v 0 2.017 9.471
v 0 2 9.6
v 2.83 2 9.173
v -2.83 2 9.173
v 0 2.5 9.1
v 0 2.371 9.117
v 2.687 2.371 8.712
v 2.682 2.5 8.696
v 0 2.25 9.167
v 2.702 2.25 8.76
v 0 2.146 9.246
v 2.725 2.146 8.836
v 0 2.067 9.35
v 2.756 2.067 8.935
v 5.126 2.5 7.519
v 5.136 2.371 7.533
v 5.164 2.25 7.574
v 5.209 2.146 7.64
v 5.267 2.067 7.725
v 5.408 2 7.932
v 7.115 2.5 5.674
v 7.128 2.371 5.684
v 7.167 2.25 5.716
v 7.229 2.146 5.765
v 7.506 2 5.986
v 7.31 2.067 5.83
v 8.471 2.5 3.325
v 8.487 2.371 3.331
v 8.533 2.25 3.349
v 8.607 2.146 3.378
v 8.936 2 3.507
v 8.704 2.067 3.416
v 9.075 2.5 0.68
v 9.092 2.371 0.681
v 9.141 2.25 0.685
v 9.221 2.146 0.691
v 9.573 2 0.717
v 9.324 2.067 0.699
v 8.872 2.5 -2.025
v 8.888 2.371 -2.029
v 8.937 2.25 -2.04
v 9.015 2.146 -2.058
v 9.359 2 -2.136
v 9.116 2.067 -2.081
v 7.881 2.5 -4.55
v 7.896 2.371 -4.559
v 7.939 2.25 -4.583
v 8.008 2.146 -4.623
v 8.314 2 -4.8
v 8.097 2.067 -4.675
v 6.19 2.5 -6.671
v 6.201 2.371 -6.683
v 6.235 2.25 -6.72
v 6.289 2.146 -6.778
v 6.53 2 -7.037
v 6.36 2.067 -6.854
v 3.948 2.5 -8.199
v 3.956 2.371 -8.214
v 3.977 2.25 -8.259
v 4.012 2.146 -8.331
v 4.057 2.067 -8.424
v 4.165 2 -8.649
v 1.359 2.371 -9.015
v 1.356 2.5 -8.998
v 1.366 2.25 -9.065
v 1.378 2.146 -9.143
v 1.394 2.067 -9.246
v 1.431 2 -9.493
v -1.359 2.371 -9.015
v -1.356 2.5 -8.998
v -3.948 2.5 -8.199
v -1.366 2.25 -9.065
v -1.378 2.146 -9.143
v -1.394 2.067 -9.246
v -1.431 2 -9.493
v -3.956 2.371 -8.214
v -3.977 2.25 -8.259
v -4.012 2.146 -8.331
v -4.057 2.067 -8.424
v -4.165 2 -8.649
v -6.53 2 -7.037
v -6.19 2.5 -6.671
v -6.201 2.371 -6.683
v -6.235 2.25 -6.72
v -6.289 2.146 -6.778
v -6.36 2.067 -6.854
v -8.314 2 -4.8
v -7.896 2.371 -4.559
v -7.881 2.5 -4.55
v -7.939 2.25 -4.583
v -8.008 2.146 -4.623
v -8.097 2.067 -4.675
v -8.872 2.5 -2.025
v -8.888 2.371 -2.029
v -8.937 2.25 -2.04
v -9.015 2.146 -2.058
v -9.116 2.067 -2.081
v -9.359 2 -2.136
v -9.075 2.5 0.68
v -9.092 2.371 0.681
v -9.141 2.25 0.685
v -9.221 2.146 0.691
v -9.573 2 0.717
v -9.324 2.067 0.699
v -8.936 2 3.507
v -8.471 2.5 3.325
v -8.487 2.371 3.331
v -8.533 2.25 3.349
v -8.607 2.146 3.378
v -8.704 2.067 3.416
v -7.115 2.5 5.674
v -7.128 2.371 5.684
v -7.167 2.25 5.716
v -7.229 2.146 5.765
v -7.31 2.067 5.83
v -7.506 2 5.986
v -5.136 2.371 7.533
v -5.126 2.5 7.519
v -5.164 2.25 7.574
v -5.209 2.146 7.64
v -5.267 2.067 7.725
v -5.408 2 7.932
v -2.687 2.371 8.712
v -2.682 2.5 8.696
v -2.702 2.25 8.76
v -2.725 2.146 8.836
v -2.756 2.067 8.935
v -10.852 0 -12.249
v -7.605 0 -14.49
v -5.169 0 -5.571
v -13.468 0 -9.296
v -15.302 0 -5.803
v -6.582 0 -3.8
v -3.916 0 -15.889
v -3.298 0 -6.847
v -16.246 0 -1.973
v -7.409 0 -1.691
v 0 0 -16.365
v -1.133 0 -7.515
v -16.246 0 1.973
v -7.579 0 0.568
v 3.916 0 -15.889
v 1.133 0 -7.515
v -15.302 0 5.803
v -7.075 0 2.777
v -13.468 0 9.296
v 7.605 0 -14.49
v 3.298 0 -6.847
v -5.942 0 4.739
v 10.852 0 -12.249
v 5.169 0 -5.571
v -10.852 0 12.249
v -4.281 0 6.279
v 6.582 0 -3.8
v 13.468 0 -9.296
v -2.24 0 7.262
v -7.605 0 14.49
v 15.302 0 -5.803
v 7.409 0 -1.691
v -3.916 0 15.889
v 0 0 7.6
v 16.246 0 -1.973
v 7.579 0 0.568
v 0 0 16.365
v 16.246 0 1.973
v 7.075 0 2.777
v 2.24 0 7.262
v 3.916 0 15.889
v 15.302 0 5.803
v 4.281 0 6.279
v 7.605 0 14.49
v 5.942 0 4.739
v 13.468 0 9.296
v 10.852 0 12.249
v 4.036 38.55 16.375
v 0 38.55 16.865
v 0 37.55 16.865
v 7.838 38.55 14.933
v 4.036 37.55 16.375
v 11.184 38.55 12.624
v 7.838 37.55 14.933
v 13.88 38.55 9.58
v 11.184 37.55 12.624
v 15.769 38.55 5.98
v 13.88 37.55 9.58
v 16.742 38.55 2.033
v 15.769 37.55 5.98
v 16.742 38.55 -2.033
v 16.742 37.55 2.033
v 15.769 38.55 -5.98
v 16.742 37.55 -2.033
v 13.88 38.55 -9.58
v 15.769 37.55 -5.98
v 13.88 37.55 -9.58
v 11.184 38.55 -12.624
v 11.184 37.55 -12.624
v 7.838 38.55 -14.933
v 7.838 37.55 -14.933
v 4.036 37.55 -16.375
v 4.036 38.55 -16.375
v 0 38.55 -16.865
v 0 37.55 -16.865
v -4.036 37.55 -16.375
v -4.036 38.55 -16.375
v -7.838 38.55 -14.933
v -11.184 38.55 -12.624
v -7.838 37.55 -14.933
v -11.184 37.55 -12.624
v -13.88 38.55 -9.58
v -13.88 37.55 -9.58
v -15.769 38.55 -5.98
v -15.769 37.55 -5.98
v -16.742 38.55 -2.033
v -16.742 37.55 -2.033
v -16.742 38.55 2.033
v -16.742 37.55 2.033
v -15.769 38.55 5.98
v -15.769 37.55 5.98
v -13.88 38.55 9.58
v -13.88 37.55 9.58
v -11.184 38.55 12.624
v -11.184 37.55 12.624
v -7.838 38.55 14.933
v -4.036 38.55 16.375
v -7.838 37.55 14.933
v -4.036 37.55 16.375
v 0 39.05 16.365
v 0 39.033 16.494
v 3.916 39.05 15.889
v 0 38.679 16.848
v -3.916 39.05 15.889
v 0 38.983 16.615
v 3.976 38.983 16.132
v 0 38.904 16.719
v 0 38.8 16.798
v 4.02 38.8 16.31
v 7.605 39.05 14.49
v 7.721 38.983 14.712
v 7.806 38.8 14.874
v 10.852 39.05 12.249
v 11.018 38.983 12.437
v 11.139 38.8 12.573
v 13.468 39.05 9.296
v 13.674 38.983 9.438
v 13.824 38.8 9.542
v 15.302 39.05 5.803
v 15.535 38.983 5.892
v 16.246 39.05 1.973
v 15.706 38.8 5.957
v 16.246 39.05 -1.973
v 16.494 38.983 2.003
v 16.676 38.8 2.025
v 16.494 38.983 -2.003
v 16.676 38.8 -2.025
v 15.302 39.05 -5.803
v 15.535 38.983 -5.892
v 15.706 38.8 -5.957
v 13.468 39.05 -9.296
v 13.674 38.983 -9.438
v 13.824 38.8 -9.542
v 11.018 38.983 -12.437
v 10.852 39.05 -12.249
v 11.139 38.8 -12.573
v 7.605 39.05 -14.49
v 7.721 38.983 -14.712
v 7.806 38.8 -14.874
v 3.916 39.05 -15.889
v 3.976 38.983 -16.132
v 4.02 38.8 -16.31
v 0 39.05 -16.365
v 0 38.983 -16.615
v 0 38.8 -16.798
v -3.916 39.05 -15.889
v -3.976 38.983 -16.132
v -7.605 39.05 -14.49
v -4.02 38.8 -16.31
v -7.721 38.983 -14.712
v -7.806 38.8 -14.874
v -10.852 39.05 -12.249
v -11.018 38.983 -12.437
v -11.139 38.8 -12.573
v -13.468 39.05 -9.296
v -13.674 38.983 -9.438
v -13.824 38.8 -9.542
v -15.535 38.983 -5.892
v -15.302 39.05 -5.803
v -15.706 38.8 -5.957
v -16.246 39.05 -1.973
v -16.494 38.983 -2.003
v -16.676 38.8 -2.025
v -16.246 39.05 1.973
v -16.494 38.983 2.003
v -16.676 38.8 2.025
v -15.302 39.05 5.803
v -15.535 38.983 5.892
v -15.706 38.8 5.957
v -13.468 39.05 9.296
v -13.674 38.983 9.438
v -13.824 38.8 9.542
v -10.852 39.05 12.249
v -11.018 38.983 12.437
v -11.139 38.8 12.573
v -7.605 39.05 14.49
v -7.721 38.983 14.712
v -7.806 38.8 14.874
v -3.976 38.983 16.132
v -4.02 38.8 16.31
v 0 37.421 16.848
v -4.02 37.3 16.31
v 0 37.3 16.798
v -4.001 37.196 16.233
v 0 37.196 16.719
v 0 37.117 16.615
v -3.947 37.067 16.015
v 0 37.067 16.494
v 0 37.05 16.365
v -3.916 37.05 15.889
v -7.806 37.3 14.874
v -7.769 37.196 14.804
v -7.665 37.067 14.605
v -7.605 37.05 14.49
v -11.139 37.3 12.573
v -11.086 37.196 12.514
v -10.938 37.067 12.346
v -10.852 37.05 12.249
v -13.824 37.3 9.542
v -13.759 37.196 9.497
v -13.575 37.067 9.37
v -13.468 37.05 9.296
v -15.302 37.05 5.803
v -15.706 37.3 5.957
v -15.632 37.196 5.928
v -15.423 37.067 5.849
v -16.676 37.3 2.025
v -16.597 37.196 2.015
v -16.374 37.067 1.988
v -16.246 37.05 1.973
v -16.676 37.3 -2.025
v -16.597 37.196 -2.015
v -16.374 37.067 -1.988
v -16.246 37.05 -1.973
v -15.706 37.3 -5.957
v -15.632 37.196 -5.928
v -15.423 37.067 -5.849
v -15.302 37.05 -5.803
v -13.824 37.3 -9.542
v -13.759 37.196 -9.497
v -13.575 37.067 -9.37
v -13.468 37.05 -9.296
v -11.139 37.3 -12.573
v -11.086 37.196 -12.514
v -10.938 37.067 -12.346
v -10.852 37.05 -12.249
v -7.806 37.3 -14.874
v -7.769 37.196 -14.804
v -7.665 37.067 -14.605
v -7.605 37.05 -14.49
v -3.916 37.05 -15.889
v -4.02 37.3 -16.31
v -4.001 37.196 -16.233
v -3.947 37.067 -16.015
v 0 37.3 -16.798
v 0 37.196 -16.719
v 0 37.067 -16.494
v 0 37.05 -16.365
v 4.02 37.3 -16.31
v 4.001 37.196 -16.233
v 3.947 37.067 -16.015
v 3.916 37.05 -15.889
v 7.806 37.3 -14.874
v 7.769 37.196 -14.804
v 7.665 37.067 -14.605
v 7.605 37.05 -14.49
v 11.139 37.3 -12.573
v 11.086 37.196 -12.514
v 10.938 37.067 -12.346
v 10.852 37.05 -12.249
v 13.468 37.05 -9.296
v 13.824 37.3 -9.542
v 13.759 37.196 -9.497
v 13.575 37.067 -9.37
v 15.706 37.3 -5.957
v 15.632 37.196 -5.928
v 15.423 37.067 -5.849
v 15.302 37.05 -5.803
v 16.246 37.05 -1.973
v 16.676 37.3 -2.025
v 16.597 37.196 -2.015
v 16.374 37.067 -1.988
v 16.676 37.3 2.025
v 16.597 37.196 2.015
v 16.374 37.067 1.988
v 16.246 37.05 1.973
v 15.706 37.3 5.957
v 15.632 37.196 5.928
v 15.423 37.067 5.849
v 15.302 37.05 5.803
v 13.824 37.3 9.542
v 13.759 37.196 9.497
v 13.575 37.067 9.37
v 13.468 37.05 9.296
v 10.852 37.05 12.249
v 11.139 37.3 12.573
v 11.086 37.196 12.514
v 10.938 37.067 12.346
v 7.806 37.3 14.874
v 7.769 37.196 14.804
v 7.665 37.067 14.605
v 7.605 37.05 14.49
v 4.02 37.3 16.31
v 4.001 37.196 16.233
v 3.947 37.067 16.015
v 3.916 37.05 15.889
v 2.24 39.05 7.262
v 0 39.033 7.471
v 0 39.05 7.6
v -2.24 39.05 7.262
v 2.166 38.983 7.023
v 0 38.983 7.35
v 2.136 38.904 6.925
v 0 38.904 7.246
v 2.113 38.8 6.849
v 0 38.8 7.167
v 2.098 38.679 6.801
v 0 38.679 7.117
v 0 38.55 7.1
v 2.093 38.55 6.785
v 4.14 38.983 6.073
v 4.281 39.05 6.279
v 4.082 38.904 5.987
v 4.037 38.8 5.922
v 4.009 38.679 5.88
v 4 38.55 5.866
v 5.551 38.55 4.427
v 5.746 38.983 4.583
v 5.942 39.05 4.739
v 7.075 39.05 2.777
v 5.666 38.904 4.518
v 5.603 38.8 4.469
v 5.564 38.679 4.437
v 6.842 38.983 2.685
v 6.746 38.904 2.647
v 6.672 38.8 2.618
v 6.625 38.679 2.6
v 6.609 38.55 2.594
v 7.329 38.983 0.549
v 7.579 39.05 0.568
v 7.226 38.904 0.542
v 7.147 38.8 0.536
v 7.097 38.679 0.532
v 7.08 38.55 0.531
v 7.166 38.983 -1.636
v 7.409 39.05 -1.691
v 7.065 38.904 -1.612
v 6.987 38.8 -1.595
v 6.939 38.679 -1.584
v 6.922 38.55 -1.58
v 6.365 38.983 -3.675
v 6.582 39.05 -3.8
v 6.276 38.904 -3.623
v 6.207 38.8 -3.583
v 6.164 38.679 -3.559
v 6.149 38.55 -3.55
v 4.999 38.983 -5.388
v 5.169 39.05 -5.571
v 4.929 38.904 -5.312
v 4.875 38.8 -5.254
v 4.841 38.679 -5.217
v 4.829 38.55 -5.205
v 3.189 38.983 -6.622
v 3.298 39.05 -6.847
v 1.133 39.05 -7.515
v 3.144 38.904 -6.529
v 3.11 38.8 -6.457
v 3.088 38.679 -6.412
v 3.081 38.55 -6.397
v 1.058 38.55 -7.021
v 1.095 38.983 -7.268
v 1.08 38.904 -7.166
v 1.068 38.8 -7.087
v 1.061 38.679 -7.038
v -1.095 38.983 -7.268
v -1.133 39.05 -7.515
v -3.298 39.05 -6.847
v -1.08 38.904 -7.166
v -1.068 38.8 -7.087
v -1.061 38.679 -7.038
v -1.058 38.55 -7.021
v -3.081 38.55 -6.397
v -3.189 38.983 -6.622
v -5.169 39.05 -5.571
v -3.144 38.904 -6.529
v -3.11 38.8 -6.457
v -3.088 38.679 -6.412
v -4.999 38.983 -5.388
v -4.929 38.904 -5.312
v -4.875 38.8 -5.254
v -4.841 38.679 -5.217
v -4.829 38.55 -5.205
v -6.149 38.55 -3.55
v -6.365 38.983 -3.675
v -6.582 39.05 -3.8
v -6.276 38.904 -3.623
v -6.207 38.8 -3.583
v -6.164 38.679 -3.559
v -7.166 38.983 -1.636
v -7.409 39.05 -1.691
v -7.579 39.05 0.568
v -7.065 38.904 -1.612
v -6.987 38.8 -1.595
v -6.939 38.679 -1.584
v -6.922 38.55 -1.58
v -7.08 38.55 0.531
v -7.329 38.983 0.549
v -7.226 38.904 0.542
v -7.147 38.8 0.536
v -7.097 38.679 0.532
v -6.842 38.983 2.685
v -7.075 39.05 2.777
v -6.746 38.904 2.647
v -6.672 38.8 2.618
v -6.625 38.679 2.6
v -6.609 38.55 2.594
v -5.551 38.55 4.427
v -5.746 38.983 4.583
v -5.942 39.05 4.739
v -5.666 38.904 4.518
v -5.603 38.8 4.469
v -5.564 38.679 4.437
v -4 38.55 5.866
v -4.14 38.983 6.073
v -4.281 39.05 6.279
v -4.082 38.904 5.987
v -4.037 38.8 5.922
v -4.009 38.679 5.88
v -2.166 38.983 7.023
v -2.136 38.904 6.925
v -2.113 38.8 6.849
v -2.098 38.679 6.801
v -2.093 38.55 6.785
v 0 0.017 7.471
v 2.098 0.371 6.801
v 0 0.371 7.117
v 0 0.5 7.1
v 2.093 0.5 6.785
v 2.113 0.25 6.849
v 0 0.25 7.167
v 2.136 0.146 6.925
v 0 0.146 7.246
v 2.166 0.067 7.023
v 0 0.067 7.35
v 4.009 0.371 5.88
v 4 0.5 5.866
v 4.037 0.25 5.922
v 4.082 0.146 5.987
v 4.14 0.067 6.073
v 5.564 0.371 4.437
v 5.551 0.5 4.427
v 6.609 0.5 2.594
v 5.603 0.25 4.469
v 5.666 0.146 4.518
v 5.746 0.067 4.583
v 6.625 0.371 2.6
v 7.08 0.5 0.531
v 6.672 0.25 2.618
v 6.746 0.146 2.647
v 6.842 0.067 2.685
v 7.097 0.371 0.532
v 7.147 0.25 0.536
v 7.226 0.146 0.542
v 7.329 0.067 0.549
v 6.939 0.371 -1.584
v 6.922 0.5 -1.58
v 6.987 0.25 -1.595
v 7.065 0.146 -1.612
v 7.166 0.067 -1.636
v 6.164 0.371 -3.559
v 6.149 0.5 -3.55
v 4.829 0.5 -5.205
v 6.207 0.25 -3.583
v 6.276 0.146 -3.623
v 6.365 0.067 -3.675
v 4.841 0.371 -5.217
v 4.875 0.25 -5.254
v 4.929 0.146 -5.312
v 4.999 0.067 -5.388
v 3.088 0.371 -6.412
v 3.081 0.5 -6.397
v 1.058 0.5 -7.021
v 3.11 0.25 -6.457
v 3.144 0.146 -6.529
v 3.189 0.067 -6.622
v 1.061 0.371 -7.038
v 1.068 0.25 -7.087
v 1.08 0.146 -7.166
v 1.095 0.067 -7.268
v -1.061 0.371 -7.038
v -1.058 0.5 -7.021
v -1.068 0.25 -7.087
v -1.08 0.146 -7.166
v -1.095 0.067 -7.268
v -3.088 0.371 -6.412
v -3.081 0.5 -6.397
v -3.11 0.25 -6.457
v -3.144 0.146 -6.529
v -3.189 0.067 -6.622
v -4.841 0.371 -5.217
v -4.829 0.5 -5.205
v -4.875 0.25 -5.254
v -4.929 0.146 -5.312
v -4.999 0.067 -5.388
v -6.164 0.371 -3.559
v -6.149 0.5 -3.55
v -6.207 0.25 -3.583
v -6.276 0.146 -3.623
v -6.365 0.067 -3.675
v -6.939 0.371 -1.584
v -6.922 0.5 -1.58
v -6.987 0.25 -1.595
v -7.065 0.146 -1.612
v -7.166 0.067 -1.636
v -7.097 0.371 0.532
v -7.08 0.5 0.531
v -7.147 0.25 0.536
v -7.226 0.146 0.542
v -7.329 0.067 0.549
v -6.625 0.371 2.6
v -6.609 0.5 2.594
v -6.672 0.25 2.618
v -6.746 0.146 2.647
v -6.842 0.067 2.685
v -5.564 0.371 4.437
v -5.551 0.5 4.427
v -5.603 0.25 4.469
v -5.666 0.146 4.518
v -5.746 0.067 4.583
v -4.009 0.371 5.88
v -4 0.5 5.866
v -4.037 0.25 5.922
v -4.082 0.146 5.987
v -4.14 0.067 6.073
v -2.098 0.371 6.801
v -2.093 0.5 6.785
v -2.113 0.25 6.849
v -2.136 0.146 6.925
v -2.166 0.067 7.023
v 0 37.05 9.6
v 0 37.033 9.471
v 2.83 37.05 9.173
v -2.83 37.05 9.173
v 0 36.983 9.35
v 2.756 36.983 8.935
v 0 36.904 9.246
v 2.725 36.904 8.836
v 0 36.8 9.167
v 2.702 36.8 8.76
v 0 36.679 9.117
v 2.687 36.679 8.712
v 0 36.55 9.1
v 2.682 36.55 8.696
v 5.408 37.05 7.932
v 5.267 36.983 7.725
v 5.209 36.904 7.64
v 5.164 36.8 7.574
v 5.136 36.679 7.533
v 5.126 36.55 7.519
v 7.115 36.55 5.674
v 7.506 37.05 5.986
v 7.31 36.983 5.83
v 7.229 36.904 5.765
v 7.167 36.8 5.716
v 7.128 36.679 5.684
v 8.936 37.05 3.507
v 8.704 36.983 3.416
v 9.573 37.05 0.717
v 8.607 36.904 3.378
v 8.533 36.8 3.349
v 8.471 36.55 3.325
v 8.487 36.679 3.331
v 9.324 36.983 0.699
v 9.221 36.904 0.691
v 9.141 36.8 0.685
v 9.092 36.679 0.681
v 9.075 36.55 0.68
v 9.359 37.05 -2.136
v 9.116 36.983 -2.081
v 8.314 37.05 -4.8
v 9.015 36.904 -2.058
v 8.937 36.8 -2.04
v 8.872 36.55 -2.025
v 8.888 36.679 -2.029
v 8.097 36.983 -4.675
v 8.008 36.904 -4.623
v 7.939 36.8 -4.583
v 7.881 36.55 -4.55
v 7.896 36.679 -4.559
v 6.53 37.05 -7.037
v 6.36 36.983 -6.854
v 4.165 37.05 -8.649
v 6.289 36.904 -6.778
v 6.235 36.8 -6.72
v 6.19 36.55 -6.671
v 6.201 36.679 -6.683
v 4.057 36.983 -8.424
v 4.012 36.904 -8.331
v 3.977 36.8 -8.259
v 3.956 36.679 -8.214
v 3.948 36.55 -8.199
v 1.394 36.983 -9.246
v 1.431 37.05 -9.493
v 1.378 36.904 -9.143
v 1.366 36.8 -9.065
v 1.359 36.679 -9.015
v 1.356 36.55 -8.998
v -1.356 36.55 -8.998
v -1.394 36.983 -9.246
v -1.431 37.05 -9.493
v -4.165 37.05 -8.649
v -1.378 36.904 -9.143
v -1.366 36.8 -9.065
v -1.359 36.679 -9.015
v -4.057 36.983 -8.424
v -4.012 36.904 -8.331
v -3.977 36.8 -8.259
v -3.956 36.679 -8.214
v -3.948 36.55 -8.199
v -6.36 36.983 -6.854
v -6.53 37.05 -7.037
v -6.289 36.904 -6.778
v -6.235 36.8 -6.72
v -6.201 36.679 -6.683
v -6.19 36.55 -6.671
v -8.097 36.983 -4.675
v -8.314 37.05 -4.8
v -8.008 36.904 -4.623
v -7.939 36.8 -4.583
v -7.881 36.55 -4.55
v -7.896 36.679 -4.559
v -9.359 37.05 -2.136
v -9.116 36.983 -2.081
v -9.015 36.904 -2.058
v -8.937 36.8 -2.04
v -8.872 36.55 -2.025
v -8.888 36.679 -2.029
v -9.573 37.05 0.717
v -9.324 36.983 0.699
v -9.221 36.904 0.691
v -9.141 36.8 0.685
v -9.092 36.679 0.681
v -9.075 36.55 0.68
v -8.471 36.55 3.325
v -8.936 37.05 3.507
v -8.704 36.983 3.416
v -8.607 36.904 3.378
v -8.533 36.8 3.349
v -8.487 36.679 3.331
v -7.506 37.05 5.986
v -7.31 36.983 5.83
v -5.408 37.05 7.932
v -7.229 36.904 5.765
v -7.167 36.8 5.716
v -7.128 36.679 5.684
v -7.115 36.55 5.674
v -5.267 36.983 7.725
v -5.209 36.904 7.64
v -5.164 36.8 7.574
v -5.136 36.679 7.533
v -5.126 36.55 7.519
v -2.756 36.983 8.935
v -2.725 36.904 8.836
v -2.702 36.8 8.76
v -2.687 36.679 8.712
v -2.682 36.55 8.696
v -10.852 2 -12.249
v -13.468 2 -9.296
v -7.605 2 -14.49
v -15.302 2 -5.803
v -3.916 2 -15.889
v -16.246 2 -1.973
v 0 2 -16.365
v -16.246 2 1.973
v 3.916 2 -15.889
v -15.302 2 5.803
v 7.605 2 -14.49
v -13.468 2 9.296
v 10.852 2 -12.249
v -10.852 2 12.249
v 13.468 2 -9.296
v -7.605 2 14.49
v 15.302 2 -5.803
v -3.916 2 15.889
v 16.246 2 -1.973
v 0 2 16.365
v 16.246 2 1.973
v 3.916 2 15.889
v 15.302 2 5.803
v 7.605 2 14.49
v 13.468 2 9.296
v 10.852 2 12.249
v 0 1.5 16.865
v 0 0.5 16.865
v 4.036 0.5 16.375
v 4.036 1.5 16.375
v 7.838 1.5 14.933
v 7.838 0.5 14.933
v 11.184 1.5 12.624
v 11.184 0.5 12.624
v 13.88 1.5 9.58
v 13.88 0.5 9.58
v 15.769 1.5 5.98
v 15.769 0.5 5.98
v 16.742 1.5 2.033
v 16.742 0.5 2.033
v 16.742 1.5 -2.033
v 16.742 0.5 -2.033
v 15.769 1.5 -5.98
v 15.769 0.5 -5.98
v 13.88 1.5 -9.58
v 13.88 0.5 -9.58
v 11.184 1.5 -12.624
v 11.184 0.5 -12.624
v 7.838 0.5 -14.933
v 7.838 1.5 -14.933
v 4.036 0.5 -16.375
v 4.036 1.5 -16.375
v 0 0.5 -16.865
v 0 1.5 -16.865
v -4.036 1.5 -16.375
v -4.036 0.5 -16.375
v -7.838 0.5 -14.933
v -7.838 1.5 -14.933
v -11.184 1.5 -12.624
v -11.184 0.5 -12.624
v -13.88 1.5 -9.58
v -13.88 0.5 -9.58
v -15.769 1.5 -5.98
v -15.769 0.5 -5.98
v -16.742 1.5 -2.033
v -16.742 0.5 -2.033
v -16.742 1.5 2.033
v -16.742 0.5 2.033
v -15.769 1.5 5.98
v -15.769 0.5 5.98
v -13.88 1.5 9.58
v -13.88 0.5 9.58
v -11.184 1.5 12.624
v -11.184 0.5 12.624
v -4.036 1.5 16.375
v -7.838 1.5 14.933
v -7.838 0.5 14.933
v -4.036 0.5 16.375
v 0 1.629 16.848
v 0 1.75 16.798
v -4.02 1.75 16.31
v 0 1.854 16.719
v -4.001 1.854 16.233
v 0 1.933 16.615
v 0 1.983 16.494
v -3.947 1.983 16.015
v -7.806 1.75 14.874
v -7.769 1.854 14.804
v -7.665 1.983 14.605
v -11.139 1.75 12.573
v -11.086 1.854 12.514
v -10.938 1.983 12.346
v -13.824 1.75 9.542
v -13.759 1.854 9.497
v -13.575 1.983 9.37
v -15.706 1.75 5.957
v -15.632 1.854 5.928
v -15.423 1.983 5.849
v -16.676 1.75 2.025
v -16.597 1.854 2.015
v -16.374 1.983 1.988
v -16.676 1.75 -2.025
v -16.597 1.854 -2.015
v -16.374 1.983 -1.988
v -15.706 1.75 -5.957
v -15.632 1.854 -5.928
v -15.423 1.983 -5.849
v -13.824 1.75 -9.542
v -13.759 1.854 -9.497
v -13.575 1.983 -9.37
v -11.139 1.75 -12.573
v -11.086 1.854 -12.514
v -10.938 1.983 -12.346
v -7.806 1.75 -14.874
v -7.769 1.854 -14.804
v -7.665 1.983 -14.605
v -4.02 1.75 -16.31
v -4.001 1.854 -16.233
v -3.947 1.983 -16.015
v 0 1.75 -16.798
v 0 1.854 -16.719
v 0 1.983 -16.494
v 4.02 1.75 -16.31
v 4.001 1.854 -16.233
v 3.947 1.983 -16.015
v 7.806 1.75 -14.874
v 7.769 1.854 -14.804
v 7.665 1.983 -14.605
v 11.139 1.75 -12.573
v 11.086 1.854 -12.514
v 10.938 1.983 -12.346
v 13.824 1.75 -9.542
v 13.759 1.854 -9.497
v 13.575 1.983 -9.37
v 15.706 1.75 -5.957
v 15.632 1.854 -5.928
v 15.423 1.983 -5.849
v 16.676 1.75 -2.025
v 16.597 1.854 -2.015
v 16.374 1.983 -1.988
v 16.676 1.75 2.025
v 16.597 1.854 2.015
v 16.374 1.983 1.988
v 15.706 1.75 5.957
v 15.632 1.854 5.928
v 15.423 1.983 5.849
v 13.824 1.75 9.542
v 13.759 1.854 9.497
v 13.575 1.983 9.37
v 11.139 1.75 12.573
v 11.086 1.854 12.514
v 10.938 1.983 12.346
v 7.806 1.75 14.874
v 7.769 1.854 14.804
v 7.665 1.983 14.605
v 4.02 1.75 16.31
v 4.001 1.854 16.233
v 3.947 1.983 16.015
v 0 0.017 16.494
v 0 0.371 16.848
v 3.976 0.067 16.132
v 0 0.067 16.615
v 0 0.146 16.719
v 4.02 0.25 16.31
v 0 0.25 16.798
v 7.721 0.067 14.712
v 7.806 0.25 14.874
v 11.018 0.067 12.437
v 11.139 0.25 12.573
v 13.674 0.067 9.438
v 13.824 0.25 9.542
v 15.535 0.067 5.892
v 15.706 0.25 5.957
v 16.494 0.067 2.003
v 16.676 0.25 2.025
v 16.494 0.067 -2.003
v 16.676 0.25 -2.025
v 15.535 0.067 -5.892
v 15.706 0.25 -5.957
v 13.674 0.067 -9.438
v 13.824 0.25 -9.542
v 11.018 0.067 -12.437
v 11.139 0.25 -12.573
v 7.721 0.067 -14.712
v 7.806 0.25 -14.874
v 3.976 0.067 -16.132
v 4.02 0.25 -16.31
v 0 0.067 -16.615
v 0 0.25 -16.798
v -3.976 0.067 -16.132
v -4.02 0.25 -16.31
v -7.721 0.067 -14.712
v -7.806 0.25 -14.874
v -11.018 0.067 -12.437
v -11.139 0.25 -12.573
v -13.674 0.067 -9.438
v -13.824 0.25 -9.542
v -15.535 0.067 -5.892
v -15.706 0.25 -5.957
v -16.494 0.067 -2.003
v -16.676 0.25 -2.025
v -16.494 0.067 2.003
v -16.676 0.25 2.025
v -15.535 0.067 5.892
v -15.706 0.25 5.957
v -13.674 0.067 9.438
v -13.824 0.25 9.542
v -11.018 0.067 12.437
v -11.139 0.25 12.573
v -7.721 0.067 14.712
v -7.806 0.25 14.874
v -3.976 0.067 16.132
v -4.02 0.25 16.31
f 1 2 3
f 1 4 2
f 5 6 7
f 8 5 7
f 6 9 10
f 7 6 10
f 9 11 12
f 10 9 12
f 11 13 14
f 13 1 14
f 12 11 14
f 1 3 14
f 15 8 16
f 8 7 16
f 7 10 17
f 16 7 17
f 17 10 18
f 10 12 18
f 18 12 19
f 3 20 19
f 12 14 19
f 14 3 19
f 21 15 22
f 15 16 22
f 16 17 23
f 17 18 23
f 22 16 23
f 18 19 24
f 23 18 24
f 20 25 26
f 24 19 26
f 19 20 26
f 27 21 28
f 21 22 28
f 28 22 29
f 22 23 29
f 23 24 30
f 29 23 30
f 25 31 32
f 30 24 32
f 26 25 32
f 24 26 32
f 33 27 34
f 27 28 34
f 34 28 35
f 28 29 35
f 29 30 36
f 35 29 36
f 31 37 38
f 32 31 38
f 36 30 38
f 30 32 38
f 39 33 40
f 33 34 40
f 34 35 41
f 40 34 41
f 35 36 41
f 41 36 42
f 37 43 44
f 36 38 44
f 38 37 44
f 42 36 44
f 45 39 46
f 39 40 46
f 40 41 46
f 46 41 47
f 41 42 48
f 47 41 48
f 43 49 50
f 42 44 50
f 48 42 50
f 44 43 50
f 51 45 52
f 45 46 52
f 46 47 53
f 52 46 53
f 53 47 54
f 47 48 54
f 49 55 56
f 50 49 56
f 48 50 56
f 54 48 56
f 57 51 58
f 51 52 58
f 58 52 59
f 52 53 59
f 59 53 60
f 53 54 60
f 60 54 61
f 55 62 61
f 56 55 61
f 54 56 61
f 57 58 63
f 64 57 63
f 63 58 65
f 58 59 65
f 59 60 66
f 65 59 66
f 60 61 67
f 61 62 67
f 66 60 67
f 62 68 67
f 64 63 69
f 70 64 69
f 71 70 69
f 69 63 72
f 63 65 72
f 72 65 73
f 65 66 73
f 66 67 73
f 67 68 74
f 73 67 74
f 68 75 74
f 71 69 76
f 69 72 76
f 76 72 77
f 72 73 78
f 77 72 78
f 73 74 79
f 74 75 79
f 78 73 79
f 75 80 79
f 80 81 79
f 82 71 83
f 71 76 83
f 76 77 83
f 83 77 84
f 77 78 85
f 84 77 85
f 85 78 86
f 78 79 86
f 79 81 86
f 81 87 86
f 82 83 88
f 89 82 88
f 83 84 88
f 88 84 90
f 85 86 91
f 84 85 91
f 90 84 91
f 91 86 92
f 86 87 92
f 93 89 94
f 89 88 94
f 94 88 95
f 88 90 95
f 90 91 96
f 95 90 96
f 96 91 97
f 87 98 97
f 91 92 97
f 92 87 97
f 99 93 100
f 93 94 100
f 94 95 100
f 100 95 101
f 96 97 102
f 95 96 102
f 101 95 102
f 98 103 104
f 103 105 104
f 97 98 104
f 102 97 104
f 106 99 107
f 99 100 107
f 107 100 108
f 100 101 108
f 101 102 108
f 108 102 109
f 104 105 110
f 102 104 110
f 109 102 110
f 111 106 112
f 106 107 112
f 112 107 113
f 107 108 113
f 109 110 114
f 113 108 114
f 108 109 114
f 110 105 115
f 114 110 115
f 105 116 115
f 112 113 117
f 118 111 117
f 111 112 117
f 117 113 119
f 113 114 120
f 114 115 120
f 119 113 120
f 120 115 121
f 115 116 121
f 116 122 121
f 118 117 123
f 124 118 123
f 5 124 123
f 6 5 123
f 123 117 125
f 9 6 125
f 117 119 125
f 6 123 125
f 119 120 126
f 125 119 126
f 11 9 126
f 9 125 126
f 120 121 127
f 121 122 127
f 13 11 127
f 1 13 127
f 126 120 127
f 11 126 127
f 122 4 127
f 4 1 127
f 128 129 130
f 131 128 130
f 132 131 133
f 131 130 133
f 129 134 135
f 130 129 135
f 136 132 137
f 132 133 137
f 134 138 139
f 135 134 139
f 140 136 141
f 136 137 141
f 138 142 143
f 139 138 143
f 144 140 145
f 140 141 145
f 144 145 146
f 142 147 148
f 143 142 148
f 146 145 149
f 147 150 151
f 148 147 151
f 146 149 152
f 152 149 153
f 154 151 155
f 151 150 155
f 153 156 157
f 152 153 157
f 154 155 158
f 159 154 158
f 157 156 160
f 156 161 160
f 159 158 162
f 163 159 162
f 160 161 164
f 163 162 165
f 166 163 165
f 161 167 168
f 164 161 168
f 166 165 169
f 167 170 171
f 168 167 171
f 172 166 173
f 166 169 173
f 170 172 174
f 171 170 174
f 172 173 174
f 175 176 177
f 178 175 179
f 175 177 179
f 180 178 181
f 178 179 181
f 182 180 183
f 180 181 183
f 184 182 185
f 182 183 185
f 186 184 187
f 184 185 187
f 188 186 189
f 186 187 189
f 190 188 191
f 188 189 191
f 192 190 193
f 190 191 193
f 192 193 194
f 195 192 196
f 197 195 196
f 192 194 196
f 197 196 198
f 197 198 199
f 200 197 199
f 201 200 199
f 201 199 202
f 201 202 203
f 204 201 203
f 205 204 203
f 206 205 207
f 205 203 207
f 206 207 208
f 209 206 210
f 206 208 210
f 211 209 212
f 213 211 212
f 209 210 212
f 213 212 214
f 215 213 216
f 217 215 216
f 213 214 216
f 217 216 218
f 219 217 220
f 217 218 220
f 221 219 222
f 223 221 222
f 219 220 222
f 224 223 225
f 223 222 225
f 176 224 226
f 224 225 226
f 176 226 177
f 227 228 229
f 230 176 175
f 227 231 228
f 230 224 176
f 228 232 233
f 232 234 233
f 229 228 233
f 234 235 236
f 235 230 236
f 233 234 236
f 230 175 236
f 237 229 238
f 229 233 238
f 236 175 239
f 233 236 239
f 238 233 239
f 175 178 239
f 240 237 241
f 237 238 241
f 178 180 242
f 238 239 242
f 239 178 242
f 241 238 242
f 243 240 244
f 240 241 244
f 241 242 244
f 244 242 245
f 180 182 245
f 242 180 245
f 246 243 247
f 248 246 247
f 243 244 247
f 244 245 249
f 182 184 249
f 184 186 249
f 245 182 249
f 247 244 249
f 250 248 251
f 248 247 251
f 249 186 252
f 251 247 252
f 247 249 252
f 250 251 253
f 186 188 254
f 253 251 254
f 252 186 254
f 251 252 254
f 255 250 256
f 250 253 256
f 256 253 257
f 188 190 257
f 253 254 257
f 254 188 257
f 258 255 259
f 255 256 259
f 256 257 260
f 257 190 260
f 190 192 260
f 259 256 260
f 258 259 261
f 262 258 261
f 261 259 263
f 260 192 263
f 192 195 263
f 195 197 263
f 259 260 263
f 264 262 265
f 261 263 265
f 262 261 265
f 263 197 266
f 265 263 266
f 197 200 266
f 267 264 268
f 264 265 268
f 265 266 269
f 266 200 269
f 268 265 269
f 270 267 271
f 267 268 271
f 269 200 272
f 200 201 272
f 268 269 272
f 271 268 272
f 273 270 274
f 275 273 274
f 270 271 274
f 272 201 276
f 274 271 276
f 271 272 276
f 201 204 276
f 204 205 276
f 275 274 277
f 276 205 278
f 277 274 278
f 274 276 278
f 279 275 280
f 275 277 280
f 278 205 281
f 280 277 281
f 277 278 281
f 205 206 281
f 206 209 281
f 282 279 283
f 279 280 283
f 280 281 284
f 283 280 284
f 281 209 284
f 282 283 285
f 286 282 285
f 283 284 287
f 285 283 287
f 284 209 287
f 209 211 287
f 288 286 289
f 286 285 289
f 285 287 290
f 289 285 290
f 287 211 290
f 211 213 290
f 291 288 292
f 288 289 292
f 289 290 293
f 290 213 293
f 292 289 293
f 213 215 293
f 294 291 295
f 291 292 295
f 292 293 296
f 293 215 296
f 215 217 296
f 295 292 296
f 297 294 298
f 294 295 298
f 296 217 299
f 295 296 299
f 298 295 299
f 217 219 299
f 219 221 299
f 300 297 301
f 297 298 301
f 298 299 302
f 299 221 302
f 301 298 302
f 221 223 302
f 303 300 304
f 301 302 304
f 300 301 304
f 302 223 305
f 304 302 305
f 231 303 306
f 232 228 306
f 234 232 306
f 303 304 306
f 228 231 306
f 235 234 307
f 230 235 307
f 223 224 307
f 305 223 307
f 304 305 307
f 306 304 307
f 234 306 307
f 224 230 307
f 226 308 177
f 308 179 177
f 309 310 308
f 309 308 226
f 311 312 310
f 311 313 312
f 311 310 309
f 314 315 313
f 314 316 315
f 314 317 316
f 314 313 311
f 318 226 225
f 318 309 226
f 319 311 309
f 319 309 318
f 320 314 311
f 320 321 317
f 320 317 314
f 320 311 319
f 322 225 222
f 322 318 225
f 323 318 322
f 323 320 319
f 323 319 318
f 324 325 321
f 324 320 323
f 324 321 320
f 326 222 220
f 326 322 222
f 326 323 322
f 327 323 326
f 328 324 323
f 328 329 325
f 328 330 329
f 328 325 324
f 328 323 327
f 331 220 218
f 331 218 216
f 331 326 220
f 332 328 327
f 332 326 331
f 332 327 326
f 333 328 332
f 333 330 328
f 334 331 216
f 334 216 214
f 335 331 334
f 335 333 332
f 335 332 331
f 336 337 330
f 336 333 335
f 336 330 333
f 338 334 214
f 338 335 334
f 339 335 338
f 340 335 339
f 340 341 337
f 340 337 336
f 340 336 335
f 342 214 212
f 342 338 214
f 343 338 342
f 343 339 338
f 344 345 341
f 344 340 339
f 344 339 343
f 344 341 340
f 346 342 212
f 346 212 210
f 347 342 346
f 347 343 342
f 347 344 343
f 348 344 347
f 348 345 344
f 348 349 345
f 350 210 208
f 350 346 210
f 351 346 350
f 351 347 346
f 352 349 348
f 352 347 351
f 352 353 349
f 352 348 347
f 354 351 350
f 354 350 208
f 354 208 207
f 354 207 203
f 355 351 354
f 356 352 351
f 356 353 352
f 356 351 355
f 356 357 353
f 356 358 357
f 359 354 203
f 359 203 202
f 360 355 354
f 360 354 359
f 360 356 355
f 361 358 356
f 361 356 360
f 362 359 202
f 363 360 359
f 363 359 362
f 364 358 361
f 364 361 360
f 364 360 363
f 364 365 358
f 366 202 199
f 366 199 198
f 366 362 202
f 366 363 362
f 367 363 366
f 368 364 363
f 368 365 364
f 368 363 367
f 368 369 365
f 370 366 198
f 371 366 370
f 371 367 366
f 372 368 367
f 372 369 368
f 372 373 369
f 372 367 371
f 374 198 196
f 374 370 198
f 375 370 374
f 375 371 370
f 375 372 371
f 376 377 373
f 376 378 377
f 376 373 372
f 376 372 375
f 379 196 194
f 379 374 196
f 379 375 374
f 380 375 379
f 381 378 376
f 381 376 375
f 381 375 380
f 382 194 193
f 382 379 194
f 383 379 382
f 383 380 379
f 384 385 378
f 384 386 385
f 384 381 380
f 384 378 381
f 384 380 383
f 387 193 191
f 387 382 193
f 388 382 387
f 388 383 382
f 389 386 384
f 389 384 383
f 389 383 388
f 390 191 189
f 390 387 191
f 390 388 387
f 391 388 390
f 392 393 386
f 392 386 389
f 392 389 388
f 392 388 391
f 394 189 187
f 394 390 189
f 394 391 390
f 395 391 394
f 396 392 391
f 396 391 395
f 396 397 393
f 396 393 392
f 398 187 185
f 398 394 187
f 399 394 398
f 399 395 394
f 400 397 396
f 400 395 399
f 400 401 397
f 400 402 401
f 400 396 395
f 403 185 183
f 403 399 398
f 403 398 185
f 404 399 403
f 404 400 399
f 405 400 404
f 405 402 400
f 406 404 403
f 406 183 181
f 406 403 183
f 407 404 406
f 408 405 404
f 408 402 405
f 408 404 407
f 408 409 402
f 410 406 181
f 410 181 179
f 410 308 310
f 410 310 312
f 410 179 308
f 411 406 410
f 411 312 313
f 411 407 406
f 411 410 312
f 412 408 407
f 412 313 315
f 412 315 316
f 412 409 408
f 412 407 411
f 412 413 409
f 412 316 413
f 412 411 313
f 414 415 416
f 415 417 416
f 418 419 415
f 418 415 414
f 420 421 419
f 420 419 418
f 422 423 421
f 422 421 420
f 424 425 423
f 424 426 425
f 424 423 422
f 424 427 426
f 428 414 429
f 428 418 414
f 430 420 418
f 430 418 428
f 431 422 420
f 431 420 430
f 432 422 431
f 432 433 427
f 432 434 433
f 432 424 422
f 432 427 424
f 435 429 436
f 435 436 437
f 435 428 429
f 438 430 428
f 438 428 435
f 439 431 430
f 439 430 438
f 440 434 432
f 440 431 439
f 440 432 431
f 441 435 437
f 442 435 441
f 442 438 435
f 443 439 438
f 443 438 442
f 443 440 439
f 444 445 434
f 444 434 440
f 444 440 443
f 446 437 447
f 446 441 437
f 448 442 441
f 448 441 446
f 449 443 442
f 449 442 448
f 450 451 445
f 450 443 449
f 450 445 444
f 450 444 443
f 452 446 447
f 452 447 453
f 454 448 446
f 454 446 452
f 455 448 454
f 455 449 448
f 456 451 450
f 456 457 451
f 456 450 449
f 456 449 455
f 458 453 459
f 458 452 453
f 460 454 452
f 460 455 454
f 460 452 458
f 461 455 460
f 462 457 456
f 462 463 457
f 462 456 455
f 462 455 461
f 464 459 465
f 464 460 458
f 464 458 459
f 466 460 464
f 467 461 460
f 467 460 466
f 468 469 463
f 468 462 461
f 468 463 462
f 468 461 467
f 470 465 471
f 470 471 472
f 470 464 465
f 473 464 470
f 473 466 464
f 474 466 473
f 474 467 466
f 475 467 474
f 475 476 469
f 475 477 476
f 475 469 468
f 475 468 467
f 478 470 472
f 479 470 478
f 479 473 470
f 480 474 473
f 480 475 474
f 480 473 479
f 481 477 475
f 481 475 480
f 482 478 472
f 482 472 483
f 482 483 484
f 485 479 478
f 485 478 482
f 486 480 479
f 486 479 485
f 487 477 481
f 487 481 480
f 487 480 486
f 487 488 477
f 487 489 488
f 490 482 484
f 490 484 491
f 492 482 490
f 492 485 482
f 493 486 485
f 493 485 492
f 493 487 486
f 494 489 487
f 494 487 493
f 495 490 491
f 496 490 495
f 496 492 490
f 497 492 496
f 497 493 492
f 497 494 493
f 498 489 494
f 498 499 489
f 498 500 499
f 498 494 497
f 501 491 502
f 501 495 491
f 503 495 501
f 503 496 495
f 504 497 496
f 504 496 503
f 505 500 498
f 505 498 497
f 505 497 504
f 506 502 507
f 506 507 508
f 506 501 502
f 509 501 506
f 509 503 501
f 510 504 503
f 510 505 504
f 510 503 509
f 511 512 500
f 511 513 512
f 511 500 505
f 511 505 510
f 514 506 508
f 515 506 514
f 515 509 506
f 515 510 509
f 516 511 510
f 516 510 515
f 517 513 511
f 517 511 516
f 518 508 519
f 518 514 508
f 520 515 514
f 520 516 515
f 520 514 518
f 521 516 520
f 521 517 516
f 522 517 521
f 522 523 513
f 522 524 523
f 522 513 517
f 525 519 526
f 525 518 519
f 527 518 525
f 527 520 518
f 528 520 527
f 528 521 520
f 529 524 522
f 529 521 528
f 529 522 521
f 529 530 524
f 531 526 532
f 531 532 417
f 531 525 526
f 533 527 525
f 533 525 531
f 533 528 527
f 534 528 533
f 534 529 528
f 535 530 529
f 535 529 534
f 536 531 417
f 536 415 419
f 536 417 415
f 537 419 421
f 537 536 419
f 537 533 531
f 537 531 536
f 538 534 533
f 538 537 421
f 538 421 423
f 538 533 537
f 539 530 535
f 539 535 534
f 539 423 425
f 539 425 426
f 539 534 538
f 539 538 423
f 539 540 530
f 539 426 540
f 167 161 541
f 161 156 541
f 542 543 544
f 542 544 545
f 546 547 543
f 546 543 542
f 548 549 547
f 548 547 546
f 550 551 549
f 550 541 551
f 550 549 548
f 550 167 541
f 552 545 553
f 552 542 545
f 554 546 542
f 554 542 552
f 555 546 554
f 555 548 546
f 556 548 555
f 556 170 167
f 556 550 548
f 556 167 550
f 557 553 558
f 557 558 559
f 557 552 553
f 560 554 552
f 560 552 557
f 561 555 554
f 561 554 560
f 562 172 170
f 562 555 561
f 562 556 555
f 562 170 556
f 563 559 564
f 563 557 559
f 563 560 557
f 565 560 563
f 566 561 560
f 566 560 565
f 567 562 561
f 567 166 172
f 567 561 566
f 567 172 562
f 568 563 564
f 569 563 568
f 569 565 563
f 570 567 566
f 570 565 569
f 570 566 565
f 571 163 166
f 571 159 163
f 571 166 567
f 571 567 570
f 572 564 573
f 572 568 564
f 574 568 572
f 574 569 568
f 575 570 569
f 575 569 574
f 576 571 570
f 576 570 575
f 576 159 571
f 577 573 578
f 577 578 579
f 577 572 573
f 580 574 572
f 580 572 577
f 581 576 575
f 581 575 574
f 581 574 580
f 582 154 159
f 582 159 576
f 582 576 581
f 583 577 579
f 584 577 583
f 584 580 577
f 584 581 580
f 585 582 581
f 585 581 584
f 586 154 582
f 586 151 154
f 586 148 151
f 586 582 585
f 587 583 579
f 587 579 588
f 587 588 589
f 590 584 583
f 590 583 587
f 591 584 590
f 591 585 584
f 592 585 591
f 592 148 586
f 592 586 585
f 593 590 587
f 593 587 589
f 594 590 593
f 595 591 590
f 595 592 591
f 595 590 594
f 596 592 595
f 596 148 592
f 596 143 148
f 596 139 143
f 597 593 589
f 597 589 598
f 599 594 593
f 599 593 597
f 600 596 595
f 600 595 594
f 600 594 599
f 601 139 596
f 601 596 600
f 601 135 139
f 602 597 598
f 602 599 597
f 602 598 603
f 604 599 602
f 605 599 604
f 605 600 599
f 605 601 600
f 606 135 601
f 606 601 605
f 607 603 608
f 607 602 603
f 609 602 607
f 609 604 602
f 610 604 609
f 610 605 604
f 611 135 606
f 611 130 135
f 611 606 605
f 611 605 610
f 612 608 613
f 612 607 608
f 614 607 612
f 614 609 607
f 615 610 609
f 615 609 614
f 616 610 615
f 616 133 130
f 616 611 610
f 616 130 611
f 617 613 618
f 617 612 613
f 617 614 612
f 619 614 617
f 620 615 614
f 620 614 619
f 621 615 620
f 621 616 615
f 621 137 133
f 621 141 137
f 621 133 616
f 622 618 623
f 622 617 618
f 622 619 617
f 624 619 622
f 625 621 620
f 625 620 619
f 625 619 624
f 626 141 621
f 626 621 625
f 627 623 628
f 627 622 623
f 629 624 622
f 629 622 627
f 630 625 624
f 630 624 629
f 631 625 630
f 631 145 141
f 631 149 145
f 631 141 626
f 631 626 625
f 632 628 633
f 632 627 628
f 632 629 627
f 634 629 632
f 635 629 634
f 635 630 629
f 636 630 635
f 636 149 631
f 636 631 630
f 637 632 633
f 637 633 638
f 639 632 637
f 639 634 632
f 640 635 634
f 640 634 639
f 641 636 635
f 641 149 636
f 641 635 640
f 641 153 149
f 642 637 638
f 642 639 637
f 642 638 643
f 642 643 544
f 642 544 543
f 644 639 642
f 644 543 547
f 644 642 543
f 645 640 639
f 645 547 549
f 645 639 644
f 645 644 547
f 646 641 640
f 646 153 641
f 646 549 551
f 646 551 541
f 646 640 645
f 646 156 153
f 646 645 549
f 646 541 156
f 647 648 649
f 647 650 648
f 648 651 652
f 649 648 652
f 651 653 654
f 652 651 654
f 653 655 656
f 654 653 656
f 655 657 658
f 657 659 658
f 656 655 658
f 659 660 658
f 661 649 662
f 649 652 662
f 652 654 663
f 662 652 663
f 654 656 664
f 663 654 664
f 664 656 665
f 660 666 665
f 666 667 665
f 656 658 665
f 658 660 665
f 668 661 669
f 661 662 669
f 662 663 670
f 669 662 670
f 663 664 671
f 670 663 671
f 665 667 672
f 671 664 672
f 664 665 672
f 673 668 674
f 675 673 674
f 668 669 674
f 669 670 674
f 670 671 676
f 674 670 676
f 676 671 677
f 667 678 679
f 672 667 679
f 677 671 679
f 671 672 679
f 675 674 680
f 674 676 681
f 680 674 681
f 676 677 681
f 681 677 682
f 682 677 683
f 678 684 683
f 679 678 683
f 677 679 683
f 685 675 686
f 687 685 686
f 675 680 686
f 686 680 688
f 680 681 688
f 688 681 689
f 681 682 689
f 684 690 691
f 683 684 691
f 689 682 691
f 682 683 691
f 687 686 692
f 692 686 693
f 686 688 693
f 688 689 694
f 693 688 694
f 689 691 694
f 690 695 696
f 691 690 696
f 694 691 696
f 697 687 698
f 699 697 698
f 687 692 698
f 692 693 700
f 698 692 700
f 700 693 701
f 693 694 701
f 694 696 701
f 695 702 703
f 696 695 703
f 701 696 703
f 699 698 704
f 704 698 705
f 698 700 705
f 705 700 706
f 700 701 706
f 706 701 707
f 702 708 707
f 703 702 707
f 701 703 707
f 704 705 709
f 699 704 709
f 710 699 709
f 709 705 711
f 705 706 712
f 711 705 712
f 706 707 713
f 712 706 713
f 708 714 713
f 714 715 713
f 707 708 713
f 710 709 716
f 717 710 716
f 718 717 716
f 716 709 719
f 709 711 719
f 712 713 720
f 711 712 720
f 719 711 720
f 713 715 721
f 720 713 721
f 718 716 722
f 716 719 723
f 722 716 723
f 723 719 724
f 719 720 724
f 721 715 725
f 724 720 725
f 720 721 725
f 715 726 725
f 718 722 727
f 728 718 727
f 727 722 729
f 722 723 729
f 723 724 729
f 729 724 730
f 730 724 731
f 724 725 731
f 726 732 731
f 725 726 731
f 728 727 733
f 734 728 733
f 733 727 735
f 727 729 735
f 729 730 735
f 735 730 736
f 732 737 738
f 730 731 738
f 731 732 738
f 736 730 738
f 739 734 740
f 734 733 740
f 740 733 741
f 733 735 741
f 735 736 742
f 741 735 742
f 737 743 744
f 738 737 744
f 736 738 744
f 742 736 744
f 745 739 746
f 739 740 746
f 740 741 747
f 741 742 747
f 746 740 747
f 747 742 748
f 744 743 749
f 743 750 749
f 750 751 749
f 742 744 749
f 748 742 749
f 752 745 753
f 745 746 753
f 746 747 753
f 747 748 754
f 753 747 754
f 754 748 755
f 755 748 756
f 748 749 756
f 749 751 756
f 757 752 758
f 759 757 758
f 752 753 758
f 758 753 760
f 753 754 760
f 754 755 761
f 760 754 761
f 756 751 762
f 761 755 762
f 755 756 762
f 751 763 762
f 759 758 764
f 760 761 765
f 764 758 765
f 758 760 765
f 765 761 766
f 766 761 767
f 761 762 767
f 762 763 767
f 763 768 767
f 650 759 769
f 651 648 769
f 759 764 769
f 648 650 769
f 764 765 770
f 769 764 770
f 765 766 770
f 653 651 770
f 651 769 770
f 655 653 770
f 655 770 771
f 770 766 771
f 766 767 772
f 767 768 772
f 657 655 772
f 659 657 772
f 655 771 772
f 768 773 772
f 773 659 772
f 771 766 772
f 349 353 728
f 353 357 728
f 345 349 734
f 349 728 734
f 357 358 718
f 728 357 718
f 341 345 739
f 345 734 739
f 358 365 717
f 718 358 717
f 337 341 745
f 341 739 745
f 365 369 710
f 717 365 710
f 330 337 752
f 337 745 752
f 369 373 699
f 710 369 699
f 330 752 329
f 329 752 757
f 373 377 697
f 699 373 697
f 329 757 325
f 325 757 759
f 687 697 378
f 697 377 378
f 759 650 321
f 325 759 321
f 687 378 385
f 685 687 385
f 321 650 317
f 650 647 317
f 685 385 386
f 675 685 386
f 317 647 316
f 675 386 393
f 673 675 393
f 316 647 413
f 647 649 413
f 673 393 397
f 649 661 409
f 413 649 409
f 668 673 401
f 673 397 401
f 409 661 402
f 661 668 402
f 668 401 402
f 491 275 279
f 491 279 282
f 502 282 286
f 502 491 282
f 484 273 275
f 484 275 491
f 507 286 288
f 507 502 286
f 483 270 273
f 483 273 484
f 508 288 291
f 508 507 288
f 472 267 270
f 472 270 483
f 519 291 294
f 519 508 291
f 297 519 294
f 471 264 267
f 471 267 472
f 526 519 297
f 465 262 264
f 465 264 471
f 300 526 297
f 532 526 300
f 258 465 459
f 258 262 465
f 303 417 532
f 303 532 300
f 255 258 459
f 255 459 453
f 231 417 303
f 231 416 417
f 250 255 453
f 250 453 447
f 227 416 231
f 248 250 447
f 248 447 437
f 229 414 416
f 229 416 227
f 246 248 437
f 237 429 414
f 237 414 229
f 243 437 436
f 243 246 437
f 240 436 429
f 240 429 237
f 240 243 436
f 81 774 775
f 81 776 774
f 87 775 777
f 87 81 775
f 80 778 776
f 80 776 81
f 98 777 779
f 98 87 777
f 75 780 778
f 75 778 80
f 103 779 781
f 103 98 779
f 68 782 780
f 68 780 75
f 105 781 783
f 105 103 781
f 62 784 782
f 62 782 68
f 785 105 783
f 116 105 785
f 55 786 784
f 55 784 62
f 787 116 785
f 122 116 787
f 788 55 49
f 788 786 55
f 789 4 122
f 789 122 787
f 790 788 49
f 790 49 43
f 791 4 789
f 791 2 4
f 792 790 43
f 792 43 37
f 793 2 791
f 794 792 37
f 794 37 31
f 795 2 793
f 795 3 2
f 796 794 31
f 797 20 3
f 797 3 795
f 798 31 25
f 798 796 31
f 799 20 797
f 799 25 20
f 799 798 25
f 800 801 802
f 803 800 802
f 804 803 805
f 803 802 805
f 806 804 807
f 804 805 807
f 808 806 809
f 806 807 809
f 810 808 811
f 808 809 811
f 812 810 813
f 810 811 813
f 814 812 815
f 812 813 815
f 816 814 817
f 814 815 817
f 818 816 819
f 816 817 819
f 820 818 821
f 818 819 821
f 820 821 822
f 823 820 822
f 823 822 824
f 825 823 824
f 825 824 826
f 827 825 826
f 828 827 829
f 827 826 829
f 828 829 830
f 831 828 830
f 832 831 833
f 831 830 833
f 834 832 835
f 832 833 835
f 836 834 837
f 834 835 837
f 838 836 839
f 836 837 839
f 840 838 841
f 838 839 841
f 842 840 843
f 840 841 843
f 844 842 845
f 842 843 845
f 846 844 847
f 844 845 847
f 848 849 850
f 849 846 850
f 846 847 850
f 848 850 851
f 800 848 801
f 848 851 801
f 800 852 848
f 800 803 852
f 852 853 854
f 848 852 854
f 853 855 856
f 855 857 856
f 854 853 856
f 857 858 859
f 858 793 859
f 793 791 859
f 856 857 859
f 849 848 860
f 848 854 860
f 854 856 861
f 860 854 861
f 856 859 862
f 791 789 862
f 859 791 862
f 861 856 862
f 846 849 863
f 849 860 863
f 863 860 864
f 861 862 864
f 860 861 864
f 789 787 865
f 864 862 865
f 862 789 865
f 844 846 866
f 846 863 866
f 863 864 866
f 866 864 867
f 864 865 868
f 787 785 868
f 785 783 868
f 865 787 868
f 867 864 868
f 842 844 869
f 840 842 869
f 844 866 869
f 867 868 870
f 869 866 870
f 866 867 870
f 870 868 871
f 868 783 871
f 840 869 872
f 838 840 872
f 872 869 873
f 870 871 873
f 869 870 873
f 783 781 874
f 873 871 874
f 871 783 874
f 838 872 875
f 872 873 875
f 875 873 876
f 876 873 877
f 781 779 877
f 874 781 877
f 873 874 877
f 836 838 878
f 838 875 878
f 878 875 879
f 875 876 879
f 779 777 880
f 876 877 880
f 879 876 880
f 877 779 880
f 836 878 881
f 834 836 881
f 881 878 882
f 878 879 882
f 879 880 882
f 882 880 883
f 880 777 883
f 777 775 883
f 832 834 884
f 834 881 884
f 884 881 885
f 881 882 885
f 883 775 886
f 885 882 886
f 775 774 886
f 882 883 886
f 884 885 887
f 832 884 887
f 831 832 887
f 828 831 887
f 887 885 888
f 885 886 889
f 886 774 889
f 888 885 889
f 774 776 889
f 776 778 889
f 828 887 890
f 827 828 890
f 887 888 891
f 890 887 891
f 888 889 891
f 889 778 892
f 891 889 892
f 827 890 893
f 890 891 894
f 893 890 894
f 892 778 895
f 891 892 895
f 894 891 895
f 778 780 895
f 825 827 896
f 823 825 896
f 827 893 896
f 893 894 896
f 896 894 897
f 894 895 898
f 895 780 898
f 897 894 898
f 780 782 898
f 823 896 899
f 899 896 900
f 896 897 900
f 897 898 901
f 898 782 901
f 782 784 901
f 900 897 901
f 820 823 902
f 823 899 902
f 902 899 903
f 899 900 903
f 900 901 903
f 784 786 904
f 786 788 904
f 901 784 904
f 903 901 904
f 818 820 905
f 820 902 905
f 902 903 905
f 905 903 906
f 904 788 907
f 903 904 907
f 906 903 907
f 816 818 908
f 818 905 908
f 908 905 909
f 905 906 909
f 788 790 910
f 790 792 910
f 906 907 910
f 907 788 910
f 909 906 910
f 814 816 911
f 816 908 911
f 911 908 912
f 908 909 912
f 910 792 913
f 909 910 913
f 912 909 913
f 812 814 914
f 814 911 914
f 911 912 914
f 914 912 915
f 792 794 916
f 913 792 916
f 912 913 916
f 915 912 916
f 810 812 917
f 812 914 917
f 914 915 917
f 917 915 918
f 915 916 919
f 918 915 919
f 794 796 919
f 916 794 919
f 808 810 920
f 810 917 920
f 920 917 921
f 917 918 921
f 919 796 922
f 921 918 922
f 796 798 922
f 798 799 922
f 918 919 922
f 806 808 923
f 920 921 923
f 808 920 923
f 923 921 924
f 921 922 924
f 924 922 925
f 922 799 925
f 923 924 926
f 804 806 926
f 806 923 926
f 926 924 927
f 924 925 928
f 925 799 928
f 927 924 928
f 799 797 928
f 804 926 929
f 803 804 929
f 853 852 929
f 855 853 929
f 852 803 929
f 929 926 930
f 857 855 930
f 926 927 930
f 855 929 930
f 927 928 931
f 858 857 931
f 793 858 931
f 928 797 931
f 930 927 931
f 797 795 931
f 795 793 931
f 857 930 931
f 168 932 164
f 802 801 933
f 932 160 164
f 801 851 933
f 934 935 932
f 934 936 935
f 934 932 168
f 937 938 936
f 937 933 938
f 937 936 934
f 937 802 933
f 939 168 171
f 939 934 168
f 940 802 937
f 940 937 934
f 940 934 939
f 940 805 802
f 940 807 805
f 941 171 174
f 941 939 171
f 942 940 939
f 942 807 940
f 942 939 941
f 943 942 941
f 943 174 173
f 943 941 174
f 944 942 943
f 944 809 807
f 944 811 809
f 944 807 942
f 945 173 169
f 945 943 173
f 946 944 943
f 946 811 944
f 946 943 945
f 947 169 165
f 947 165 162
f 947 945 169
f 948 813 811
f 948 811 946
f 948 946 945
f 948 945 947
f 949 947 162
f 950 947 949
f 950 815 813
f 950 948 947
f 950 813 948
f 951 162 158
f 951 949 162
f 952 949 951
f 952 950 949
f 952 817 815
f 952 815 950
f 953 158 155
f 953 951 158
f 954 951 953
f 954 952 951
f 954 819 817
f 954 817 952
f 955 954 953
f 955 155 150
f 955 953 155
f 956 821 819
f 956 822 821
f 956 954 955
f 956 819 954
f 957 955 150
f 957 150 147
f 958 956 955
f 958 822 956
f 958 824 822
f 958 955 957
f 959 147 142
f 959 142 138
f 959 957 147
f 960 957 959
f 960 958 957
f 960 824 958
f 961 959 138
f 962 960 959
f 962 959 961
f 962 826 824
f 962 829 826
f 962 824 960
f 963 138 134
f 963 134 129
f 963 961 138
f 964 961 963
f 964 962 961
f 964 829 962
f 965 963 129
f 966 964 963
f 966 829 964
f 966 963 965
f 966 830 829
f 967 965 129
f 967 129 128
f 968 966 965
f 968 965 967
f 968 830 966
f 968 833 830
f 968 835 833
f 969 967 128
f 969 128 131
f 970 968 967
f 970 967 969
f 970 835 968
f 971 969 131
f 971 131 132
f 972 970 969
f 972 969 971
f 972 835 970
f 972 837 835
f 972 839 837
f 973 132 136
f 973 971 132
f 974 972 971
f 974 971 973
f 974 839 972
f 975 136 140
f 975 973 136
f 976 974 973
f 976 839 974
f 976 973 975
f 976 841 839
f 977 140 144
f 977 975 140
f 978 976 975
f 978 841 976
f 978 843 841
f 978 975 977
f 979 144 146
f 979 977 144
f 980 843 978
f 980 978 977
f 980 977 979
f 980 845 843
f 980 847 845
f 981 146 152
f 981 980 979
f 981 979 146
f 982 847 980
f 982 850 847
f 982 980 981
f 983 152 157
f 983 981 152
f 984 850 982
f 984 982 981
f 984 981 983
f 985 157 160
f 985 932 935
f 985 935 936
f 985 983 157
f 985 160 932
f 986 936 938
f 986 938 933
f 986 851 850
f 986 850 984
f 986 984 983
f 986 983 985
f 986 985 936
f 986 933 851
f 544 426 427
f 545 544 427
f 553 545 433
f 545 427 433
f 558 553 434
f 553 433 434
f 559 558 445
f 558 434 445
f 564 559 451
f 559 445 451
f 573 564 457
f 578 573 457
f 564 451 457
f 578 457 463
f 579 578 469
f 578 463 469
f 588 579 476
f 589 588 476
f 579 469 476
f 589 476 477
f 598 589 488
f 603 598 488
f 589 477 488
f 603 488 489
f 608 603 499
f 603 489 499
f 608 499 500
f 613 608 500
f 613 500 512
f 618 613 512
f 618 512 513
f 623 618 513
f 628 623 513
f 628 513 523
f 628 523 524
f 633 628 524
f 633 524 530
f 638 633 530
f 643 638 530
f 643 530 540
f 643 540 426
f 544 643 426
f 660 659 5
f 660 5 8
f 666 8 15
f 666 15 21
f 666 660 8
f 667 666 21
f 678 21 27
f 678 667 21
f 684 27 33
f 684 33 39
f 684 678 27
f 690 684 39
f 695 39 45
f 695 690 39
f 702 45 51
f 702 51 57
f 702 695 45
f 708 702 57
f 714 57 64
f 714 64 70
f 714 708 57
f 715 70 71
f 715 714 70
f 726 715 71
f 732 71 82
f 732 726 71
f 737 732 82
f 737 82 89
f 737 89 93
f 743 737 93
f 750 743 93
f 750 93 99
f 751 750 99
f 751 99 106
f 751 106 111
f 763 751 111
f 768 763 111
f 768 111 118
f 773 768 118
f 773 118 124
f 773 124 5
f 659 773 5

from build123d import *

# Parameters (mm, degrees)
SKETCH1_R           = 16.865
BOSS_EXTRUDE1_DEPTH = 39.05
SKETCH2_R           = 7.1
CUT_EXTRUDE1_DEPTH  = 46.757610842
SHELL5_T            = -2
FILLET1_R           = 0.5


with BuildPart() as part:
    # Sketch1 → Boss-Extrude1 (new body)
    with BuildSketch(Plane(origin=(0, 0, 0), x_dir=(1, 0, 0), z_dir=(0, 1, 0))):
        with Locations(Location((0, 0, 0), (0, 0, 270))):
            Circle(SKETCH1_R)
    extrude(amount=BOSS_EXTRUDE1_DEPTH)

    # Sketch2 → Cut-Extrude1 (cut, through all)
    with BuildSketch(Plane(origin=(0, 39.05, 0), x_dir=(1, 0, 0), z_dir=(0, 1, 0))):
        with Locations(Location((0, 0, 0), (0, 0, 270))):
            Circle(SKETCH2_R)
    extrude(amount=-CUT_EXTRUDE1_DEPTH, mode=Mode.SUBTRACT)

    # Shell5
    shell5_openings = [part.faces().sort_by_distance(p)[0] for p in [
        (0, 19.525, -16.865),
    ]]
    offset(amount=SHELL5_T, openings=shell5_openings, kind=Kind.INTERSECTION)

    # Fillet1
    fillet1_edges = [part.edges().sort_by_distance(p)[0] for p in [
        (0, 2, -16.865),
        (0, 37.05, -16.865),
        (0, 2, -9.1),
        (0, 37.05, -9.1),
        (0, 0, -16.865),
        (0, 39.05, -16.865),
        (0, 0, -7.1),
        (0, 39.05, -7.1),
    ]]
    fillet(fillet1_edges, radius=FILLET1_R)


solid = part.part
